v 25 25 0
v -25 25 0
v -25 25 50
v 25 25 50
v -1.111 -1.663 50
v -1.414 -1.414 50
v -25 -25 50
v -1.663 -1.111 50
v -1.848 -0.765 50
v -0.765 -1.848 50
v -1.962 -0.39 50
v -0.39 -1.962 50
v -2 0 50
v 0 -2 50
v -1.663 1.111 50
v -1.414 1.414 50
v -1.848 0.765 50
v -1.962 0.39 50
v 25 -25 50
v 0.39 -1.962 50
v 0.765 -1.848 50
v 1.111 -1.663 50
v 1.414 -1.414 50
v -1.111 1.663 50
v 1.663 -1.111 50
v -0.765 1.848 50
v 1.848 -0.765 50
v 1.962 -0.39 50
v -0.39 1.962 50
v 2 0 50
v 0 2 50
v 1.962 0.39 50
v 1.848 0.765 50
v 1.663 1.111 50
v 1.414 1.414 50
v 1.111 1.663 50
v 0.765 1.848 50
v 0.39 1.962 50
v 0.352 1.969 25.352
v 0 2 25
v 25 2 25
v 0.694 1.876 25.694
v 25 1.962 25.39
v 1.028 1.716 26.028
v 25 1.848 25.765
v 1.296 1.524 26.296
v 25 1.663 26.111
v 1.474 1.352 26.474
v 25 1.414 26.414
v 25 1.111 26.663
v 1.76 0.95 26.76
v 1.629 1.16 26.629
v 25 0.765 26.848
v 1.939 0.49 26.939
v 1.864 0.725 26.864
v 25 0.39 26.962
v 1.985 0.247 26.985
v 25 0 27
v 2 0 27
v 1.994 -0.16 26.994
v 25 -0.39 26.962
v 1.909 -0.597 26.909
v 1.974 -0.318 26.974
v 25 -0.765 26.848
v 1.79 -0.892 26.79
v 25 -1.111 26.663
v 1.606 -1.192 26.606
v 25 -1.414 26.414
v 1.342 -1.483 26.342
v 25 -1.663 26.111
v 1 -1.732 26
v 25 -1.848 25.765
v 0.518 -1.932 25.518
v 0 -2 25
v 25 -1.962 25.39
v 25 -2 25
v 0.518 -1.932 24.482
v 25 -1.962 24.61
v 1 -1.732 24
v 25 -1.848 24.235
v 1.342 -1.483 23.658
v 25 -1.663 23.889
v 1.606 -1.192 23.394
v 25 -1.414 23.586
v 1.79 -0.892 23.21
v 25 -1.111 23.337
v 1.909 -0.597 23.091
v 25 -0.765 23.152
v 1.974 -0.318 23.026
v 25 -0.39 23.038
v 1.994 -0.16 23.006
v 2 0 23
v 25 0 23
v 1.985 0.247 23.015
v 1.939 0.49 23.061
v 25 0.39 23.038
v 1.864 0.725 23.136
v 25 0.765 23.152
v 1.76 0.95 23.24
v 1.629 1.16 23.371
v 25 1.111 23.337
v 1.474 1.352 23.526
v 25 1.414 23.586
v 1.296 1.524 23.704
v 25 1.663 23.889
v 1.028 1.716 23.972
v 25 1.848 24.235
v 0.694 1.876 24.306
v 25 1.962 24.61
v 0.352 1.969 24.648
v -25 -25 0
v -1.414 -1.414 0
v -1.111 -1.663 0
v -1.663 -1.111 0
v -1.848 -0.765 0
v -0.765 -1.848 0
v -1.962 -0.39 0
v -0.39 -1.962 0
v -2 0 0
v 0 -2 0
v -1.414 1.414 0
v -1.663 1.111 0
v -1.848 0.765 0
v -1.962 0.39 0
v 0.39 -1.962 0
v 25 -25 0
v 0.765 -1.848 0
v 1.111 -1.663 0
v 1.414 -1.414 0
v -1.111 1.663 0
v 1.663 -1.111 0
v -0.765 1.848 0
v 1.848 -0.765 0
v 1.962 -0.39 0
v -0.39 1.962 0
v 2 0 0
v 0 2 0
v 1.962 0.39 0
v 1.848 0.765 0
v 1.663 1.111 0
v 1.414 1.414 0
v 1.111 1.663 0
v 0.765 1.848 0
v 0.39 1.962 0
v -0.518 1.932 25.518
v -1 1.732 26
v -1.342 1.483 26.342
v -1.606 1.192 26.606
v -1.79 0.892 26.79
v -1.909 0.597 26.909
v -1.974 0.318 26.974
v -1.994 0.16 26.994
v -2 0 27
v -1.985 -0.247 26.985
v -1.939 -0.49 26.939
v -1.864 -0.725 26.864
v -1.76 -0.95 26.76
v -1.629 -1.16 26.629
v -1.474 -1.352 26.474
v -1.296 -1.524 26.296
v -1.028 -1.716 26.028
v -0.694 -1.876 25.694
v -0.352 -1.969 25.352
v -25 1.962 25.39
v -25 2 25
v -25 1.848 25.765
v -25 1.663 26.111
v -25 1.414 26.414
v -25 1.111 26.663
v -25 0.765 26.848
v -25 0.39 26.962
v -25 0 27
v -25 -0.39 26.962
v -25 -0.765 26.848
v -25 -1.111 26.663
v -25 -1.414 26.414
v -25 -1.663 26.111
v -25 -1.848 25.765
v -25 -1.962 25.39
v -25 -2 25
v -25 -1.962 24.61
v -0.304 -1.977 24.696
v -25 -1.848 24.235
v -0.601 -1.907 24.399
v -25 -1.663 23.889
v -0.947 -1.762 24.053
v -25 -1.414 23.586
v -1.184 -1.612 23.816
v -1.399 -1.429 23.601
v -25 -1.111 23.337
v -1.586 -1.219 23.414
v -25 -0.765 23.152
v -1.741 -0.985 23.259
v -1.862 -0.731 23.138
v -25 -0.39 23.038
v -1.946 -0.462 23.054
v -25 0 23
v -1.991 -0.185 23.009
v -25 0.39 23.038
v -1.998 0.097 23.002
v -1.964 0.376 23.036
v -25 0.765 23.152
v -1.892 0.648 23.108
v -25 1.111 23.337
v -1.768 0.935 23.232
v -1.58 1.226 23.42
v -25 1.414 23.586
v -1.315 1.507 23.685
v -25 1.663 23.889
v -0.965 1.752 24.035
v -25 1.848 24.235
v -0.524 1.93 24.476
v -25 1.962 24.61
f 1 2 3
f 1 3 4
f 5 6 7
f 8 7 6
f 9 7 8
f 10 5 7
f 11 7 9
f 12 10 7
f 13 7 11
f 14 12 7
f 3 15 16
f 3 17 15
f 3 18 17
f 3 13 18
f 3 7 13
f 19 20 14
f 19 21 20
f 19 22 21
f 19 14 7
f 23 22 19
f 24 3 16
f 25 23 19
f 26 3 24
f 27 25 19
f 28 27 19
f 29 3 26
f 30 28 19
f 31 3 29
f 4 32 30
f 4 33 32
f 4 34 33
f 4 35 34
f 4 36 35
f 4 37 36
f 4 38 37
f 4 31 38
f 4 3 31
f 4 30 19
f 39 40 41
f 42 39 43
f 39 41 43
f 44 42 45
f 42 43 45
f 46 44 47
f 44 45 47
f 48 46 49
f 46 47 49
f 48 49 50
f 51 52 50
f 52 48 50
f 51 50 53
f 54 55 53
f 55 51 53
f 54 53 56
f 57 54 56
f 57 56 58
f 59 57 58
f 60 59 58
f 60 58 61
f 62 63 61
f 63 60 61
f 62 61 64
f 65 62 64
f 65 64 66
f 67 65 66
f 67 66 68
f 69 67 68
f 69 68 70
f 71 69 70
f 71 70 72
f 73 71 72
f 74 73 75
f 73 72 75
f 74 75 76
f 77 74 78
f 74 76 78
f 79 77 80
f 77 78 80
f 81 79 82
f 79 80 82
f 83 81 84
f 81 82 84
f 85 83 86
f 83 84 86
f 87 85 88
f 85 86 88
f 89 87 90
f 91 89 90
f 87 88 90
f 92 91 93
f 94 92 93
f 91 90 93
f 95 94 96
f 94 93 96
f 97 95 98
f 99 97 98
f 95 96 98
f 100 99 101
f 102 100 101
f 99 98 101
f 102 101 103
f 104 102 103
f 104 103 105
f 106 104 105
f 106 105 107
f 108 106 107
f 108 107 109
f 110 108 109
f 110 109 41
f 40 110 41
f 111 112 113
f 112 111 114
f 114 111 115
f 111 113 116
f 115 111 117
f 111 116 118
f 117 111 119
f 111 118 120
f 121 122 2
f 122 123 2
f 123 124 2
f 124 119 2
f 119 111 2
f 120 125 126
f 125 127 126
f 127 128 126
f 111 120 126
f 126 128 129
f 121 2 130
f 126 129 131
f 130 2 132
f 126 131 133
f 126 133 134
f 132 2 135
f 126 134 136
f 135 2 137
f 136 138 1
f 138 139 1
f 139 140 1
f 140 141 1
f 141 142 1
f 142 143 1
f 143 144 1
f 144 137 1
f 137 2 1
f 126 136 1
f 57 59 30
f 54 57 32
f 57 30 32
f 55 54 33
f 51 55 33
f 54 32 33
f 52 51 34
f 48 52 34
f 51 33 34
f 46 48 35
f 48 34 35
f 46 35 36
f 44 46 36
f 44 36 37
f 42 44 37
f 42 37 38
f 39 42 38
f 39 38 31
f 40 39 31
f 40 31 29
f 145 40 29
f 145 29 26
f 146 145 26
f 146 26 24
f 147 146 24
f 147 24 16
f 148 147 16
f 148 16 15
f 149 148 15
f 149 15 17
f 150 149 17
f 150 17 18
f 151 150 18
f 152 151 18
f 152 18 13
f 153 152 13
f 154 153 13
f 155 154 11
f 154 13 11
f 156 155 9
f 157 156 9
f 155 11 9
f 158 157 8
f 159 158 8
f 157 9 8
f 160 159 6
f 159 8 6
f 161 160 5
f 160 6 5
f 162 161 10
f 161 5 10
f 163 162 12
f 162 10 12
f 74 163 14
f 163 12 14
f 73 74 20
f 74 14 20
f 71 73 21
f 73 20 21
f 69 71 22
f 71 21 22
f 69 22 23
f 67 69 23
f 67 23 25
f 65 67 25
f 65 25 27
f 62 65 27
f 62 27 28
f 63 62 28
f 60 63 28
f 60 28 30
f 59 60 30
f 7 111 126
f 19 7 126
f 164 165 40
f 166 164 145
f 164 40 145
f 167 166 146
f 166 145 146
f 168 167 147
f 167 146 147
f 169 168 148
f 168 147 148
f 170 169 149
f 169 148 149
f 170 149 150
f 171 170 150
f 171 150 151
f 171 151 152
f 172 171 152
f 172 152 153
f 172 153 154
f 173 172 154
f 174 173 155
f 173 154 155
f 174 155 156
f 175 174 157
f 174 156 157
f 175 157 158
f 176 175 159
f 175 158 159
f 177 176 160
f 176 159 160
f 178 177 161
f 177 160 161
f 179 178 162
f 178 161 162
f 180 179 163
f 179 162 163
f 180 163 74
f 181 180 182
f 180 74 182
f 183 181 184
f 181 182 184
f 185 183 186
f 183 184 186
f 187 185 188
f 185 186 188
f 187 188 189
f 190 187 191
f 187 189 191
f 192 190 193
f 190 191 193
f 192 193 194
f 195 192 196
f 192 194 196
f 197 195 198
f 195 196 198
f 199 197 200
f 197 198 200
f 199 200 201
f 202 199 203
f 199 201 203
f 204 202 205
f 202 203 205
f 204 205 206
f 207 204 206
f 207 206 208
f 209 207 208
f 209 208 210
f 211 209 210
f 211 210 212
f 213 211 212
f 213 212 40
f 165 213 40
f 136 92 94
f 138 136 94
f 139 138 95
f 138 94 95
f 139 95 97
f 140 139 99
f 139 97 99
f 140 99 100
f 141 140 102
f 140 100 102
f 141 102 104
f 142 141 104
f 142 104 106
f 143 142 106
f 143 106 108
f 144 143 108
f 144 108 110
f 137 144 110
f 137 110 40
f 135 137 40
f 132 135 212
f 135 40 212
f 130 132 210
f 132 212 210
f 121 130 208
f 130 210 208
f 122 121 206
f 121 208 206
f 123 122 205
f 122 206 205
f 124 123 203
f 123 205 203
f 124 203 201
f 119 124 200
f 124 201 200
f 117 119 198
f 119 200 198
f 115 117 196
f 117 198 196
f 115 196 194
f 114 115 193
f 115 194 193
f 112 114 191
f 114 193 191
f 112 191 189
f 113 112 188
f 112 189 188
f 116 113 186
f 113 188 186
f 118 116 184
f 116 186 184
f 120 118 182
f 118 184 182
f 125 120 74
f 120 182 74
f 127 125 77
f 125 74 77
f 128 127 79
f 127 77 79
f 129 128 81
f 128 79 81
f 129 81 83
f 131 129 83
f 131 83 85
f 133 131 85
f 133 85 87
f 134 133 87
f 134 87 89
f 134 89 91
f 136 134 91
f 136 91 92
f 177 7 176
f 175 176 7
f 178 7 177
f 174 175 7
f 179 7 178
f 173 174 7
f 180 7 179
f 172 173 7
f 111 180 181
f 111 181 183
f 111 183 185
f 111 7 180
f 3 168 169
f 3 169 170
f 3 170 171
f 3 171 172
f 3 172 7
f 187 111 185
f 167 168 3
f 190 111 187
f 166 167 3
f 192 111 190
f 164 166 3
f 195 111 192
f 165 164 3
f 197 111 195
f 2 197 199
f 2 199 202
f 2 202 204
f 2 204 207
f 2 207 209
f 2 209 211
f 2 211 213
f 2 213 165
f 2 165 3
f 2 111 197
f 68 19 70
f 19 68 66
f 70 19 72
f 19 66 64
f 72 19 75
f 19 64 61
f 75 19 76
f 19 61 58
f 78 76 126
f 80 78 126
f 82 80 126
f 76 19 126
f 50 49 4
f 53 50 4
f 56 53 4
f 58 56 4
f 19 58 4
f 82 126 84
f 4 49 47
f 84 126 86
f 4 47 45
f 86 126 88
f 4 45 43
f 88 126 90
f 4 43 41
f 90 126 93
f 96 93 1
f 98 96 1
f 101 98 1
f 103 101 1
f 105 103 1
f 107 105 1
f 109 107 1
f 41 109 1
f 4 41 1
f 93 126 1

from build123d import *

# Parameters (mm, degrees)
ESBO_O5_W                = 50
ESBO_O5_H                = 50
RESSALTO_EXTRUS_O2_DEPTH = 50
ESBO_O6_R                = 2
CORTE_EXTRUS_O1_DEPTH    = 50
ESBO_O7_R                = 2
CORTE_EXTRUS_O2_DEPTH    = 50


with BuildPart() as part:
    # Esboço5 → Ressalto-extrusão2 (new body)
    with BuildSketch(Plane.XY):
        Rectangle(ESBO_O5_W, ESBO_O5_H)
    extrude(amount=RESSALTO_EXTRUS_O2_DEPTH)

    # Esboço6 → Corte-extrusão1 (cut)
    with BuildSketch(Plane.XY.offset(50)):
        Circle(ESBO_O6_R)
    extrude(amount=-CORTE_EXTRUS_O1_DEPTH, mode=Mode.SUBTRACT)

    # Esboço7 → Corte-extrusão2 (cut)
    with BuildSketch(Plane(origin=(25, 0, 0), x_dir=(0, 0, -1), z_dir=(1, 0, 0))):
        with Locations(Location((-25, 0, 0), (0, 0, 90))):
            Circle(ESBO_O7_R)
    extrude(amount=-CORTE_EXTRUS_O2_DEPTH, mode=Mode.SUBTRACT)


solid = part.part
